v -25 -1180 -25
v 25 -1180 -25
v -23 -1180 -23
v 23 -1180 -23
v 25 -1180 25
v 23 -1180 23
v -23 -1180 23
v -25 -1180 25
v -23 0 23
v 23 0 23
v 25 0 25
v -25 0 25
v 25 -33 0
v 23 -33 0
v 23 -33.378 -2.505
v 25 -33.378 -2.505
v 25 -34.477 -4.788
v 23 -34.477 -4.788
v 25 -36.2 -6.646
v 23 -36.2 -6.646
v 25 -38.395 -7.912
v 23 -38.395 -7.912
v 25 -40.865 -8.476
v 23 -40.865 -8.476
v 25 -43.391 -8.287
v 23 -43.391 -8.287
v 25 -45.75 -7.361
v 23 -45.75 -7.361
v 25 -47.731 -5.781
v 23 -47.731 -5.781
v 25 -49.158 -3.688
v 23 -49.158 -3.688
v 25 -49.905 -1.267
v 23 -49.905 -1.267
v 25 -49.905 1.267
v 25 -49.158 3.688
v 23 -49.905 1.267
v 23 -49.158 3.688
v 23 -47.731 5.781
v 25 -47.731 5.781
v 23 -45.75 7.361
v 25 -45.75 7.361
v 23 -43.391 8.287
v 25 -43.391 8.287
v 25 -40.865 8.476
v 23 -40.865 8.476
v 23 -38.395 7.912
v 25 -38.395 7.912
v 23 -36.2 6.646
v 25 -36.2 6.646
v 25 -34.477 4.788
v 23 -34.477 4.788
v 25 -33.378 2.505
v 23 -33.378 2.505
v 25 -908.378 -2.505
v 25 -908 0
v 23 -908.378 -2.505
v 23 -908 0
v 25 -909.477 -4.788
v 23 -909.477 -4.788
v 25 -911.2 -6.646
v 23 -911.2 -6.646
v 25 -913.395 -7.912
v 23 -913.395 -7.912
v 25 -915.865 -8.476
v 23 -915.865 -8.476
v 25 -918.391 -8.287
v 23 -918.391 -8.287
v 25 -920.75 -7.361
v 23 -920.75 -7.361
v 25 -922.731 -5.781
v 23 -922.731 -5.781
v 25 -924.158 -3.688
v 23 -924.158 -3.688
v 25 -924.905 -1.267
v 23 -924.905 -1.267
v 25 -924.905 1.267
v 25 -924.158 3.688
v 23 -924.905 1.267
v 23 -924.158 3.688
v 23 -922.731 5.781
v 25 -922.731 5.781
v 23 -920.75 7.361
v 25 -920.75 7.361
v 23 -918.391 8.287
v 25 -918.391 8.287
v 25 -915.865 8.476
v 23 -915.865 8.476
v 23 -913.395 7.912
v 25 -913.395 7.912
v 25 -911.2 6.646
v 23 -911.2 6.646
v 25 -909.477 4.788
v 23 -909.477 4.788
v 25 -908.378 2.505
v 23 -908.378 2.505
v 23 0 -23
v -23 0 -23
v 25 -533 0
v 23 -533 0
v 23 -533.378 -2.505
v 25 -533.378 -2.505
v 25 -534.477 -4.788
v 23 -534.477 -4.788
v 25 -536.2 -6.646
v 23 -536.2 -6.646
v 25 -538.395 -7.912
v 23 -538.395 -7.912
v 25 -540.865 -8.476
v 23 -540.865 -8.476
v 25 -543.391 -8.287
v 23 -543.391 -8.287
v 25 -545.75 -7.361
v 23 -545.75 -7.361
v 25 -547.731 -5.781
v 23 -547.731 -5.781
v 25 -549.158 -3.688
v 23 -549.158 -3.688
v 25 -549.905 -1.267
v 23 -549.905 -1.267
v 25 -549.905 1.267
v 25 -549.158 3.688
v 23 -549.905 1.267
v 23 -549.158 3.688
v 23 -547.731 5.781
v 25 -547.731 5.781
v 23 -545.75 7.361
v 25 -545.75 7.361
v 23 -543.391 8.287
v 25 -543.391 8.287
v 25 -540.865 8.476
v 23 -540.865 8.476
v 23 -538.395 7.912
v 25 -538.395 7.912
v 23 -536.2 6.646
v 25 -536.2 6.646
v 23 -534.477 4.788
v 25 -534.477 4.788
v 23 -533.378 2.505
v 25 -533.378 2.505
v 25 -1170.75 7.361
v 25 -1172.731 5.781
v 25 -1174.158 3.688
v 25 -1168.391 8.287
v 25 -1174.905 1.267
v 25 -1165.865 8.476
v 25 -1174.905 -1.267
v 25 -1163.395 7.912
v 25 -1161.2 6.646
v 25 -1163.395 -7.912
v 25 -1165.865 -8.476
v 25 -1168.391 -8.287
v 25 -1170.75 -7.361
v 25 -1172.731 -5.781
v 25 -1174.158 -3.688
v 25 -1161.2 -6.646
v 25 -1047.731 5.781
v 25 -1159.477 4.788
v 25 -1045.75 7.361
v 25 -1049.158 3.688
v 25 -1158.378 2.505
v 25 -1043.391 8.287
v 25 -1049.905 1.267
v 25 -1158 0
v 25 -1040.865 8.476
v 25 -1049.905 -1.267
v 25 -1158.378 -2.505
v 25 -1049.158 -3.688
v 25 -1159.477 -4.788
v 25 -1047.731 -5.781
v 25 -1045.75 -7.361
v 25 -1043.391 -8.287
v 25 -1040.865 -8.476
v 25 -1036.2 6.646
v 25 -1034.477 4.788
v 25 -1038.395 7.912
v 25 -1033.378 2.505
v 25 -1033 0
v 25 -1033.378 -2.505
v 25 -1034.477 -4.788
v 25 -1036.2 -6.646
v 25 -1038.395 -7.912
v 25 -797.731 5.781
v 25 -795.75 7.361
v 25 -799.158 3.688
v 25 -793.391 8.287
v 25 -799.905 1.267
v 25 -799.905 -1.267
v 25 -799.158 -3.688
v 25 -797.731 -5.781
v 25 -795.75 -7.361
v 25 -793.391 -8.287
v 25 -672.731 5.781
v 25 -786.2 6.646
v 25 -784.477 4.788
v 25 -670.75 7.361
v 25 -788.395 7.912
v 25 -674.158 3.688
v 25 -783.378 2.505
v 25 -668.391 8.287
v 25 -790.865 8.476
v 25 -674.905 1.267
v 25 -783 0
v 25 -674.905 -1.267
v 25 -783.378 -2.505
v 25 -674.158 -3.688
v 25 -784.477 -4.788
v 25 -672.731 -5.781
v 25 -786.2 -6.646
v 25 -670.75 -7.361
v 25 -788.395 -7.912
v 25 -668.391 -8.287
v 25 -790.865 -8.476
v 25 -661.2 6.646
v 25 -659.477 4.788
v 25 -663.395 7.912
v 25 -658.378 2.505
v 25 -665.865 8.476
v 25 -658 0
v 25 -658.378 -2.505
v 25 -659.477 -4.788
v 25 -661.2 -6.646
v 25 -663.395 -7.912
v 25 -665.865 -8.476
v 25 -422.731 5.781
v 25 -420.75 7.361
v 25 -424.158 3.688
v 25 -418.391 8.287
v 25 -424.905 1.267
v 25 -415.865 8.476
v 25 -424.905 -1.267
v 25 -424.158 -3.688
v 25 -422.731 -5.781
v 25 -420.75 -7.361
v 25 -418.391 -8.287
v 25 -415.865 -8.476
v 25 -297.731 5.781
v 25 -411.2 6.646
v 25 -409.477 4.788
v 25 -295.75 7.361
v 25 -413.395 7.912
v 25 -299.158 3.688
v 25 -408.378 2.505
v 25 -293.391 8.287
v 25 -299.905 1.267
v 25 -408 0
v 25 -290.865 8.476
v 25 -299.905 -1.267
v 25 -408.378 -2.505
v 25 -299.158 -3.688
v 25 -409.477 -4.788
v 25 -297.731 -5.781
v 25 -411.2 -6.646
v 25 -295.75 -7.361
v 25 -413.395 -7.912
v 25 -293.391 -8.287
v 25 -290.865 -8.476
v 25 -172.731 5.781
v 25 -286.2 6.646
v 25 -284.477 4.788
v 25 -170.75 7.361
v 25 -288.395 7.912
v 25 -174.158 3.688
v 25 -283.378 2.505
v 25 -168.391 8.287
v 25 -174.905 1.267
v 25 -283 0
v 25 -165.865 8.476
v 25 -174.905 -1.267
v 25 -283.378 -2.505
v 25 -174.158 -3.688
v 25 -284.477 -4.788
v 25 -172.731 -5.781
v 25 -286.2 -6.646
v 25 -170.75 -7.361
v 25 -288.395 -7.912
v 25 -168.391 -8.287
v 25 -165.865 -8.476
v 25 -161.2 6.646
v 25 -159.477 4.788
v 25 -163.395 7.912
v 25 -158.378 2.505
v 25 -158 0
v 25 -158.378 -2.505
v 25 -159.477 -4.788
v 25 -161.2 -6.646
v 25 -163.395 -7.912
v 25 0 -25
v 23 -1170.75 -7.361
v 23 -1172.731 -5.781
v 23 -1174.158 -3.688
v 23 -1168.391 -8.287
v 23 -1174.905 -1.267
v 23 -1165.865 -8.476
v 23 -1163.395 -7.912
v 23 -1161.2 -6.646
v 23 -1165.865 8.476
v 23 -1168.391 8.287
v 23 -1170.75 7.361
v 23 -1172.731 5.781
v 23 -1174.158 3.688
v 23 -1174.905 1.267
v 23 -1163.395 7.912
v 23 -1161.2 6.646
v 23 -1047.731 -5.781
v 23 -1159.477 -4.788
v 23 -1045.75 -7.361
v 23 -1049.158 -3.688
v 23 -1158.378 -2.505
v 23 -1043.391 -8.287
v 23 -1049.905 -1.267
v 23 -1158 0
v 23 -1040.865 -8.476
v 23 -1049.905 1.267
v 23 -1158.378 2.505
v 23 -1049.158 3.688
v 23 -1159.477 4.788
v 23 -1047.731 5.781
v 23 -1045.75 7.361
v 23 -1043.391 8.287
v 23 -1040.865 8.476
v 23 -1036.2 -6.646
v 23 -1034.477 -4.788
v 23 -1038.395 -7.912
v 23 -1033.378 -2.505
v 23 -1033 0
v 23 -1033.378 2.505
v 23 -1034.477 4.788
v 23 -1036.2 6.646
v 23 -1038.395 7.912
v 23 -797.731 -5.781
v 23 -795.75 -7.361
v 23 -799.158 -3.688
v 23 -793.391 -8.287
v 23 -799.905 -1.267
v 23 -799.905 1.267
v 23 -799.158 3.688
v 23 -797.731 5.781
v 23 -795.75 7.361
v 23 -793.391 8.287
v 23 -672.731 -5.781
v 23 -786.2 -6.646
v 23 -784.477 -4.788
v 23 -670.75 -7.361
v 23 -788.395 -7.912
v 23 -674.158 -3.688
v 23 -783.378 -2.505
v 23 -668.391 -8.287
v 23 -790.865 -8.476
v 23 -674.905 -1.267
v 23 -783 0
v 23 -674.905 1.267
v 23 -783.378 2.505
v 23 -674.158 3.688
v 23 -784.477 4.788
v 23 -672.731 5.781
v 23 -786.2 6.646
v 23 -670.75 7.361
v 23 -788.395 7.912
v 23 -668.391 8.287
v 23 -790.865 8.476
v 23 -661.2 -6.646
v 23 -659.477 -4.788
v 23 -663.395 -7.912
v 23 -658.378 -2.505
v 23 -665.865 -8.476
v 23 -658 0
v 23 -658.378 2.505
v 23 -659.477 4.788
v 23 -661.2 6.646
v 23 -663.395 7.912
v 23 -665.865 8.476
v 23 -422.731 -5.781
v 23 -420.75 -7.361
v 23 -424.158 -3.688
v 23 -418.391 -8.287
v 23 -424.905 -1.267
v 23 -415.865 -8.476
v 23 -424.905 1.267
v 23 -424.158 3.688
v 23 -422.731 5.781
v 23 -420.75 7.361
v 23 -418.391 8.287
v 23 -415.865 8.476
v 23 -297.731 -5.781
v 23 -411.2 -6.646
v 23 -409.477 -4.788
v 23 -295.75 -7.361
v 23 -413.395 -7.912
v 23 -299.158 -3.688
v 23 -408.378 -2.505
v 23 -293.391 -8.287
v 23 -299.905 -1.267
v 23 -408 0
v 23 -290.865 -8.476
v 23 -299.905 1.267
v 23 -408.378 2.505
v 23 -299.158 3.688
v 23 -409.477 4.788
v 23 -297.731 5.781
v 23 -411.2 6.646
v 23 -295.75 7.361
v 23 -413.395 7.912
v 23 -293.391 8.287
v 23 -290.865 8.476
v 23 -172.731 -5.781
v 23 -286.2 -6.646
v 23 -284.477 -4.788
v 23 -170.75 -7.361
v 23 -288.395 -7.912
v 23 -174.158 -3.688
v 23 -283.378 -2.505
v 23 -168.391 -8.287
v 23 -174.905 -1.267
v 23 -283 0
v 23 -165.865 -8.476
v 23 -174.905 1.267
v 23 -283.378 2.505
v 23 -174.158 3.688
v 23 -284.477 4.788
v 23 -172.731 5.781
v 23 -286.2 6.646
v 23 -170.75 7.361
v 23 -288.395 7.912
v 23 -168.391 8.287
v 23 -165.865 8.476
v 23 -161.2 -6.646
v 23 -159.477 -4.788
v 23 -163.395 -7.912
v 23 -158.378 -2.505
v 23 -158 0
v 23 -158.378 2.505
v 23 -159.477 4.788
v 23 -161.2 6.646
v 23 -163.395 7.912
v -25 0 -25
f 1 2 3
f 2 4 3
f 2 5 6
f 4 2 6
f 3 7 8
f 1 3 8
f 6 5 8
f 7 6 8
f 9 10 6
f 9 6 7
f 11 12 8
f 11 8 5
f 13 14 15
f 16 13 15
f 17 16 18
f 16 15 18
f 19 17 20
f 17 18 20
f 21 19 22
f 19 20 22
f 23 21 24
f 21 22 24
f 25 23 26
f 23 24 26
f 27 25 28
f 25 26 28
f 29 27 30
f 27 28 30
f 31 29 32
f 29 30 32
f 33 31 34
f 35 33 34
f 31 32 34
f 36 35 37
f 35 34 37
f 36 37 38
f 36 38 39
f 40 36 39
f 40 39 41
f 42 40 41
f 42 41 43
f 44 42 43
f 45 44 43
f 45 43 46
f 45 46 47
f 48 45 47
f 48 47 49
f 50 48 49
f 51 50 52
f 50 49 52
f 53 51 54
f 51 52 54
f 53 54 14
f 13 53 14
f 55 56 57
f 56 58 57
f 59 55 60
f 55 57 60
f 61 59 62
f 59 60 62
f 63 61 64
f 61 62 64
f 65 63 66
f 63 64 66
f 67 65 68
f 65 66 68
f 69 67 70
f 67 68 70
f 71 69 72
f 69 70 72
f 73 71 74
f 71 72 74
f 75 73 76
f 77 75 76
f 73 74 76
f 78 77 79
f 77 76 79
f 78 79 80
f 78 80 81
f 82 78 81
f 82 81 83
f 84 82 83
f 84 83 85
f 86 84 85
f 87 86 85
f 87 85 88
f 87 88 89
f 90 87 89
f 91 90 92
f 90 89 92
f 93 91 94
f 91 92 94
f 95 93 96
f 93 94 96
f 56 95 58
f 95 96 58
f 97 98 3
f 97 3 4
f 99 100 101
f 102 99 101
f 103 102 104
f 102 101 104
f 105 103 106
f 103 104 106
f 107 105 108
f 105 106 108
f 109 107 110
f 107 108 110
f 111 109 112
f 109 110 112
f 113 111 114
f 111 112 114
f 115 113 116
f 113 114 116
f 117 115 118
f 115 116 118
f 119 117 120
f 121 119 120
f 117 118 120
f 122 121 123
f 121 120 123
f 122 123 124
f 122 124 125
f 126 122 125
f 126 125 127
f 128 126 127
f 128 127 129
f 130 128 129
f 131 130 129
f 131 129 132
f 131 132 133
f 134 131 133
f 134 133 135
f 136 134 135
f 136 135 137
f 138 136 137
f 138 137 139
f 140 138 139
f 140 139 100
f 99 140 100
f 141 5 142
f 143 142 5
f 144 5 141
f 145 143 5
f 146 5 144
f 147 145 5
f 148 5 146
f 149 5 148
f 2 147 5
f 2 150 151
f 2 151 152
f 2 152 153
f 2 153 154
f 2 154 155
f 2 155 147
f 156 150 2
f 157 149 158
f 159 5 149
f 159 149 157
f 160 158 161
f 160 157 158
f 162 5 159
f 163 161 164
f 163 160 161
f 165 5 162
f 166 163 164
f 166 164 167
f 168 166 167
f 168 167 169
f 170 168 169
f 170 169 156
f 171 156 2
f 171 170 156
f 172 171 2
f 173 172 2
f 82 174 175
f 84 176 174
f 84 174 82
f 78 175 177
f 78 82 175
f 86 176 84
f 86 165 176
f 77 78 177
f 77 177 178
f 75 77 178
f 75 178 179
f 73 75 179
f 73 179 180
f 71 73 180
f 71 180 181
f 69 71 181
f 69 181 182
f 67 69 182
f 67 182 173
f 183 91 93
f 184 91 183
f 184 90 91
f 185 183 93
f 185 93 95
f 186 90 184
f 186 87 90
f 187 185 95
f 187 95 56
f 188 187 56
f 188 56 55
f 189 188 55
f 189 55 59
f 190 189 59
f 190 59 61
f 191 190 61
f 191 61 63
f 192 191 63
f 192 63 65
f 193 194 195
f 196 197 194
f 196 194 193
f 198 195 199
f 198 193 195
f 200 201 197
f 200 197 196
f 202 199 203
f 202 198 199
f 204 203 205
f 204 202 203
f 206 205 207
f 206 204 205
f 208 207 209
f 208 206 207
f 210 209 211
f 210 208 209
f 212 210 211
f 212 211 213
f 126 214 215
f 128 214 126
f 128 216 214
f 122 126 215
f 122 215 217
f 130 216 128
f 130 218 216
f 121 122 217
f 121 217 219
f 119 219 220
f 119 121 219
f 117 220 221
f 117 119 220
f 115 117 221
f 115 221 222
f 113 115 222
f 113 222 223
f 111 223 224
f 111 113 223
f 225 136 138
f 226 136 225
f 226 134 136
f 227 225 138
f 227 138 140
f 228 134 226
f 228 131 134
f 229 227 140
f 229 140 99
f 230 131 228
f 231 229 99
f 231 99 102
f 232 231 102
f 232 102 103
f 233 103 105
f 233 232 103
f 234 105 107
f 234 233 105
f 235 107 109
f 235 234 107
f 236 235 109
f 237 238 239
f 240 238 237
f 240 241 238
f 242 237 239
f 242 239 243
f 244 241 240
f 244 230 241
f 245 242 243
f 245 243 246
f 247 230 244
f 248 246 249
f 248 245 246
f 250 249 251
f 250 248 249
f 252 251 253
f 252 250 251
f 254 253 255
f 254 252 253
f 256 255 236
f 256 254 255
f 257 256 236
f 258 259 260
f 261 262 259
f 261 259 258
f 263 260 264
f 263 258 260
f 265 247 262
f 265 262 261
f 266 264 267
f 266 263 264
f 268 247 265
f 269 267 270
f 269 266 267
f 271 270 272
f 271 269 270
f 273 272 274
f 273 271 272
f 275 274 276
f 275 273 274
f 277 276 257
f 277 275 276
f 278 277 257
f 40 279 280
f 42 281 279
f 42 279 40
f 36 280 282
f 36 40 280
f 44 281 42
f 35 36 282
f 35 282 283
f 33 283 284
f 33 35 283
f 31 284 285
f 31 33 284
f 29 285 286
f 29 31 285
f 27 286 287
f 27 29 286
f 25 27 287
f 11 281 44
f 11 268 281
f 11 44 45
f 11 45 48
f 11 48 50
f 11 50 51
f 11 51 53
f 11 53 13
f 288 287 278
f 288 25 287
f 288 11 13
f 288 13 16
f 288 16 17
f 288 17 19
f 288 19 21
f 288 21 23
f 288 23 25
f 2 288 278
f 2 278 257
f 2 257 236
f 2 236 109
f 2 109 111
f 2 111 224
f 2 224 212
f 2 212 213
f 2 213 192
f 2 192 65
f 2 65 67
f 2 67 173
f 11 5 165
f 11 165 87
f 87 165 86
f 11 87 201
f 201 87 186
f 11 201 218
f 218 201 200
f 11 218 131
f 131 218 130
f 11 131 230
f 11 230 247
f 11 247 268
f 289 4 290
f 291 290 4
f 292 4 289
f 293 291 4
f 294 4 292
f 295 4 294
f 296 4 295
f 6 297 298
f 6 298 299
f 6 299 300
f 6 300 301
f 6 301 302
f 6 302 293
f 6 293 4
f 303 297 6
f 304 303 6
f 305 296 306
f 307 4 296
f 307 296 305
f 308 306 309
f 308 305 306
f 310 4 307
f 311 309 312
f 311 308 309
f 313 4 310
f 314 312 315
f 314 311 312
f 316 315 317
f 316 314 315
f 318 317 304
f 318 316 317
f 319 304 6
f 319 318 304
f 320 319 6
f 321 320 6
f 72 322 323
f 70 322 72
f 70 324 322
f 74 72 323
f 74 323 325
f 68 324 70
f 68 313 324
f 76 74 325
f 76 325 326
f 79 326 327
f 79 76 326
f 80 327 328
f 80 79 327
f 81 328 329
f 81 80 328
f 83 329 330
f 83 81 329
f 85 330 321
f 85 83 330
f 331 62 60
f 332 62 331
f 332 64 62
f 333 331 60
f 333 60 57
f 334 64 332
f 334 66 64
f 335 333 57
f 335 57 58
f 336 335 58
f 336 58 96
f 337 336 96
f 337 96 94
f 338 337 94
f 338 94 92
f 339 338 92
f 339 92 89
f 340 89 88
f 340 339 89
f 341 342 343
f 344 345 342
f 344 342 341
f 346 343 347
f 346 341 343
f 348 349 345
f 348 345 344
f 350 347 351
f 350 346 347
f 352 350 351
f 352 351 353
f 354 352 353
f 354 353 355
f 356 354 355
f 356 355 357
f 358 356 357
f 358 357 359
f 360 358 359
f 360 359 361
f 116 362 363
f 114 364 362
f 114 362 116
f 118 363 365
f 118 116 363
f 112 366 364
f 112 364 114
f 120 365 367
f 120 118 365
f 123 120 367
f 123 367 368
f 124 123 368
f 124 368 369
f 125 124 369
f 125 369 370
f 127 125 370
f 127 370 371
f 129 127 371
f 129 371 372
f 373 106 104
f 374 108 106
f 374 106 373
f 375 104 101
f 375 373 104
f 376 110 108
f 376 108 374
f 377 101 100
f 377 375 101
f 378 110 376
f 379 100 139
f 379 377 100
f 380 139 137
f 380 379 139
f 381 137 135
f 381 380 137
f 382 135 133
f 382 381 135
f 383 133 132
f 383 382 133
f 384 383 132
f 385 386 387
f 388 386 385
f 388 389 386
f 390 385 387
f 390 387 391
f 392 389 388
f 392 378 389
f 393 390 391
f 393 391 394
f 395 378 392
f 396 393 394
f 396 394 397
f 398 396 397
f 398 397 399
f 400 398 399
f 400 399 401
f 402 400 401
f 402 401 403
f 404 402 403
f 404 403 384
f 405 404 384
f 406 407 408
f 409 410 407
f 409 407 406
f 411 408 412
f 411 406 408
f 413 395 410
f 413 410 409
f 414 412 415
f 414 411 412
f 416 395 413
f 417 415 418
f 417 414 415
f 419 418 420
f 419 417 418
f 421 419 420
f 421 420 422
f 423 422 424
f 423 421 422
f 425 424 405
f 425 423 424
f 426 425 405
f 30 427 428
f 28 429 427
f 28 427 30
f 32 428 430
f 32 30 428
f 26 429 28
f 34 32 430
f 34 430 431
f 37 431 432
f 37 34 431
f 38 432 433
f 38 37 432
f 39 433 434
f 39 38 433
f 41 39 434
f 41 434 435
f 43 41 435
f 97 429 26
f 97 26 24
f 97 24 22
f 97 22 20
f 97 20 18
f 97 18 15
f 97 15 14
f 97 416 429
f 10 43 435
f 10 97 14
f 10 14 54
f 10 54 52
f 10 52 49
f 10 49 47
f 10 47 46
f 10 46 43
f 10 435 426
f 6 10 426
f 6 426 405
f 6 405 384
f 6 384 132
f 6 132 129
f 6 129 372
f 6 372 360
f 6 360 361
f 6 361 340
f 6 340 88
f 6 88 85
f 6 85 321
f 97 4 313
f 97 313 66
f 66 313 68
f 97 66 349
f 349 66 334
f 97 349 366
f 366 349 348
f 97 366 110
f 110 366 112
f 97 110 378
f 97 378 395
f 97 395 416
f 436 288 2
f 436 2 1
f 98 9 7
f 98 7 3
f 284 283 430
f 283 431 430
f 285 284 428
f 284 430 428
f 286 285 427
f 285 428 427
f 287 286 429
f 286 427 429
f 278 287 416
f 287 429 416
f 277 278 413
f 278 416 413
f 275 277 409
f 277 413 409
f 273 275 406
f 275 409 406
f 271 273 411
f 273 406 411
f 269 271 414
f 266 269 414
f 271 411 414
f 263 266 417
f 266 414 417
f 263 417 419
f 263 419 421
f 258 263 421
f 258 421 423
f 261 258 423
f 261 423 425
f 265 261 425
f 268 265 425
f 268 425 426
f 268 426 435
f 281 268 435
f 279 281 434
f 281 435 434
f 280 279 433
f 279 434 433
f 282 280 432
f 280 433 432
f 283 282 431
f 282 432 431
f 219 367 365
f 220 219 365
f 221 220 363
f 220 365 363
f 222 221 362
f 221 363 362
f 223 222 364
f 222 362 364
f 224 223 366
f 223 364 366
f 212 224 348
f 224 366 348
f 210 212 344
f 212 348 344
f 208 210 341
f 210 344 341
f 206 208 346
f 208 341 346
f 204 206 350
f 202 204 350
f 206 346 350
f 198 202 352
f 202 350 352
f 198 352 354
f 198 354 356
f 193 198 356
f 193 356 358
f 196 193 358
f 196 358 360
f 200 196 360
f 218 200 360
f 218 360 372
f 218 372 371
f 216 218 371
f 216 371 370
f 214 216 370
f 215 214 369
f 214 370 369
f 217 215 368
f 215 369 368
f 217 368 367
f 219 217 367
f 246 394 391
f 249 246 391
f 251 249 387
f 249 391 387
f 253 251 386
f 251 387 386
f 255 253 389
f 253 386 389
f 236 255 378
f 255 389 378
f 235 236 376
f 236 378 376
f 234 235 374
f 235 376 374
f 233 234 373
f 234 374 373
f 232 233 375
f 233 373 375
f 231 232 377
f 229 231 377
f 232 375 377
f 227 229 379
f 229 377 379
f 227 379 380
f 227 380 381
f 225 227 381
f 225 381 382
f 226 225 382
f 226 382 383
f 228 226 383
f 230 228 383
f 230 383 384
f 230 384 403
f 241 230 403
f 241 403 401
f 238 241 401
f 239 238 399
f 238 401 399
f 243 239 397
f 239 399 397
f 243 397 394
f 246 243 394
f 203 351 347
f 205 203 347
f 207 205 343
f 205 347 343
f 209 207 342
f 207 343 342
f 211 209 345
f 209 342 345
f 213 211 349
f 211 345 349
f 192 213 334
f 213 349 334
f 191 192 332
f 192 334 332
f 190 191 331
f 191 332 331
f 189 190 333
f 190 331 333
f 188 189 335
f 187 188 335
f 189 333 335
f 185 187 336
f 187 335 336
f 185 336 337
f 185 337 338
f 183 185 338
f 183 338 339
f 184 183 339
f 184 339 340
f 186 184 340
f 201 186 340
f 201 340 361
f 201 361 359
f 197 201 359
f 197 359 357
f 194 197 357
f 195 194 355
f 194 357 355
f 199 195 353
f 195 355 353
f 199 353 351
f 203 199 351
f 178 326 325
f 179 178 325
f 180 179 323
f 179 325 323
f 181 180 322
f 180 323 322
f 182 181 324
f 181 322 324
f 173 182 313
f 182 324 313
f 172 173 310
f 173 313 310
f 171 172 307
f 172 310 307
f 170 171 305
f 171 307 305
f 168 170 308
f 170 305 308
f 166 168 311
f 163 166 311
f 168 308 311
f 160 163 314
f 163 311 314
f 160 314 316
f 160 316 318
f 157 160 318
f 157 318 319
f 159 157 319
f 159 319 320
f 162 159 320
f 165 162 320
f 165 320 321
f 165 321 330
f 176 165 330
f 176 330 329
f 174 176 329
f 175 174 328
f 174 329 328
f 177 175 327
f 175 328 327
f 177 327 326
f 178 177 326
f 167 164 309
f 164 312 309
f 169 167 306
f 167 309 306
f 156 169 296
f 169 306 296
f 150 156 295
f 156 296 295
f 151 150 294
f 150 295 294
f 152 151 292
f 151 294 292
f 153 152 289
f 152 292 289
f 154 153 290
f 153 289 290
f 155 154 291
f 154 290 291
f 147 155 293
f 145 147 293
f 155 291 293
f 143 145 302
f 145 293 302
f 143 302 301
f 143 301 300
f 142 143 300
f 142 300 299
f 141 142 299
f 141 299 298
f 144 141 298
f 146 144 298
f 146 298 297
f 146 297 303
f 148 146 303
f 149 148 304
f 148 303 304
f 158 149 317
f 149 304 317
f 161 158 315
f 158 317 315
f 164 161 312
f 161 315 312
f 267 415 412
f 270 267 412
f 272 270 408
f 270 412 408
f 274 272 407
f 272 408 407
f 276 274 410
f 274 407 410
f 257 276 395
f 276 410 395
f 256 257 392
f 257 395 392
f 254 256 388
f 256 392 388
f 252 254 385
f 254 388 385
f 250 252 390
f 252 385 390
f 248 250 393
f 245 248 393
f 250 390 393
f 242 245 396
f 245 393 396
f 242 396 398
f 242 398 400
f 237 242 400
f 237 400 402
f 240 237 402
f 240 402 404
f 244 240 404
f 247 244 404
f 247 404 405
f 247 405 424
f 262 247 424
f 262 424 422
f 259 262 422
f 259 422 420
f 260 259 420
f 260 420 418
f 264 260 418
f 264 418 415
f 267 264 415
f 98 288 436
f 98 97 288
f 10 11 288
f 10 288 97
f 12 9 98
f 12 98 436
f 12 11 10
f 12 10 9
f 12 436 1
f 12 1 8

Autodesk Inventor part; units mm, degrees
ref_plane "YZ Plane" through (0, 0, 0) normal (1, 0, 0) x (0, 1, 0)
ref_plane "XZ Plane" through (0, 0, 0) normal (0, 1, 0) x (-1, 0, 0)
ref_plane "XY Plane" through (0, 0, 0) normal (0, 0, 1) x (1, 0, 0)
sketch "Sketch9" plane through (0, 0, 0) normal (0, 1, 0) x (-1, 0, 0)
  line L0 (25, 25) -> (-25, 25)
  line L1 (-25, 25) -> (-25, -25)
  line L2 (-25, -25) -> (25, -25)
  line L3 (25, -25) -> (25, 25)
  line L4 (25, 25) -> (-25, -25) construction
  line L5 (-25, 25) -> (25, -25) construction
  line L6 (-23, 23) -> (23, 23)
  line L7 (23, 23) -> (23, -23)
  line L8 (23, -23) -> (-23, -23)
  line L9 (-23, -23) -> (-23, 23)
  point P0 (0, 0)
  dimension "d172" = 50
  dimension "d173" = 50
  dimension "d174" = 2
extrude "Extrusion3" add sketch "Sketch9" against normal blind 1180
sketch "Sketch10" plane through (0, 0, 0) normal (1, 0, 0) x (0, 1, 0)
  line L0 (0, 25) -> (0, -25) construction
  line L1 (0, 25) -> (-1180, 25) construction
  line L2 (-1180, -25) -> (-1180, 25) construction
  line L3 (0, -25) -> (-1180, -25) construction
  line L4 (-1175, 8.5) -> (-1158, 8.5)
  line L5 (-1158, 8.5) -> (-1158, -8.5)
  line L6 (-1158, -8.5) -> (-1175, -8.5)
  line L7 (-1175, -8.5) -> (-1175, 8.5)
  line L8 (-1175, 8.5) -> (-1158, -8.5) construction
  line L9 (-1158, 8.5) -> (-1175, -8.5) construction
  circle A0 centre (-1166.5, 0) radius 8.5
  line L10 (0, 25) -> (0, -25) projected
  point P0 (0, 0)
  point P1 (0, 0)
  point P2 (-1180, 0)
  dimension "d177" = 17
  dimension "d178" = 17
  dimension "d191" = 5
extrude "Extrusion4" cut sketch "Sketch10" along normal through all contours A0
pattern_linear "Rectangular Pattern4" count 10 spacing 125 along (0, 1, 0) of "Extrusion4"
properties part number "TKS 3533 FDS WAY tube3" material "Stainless Steel"
